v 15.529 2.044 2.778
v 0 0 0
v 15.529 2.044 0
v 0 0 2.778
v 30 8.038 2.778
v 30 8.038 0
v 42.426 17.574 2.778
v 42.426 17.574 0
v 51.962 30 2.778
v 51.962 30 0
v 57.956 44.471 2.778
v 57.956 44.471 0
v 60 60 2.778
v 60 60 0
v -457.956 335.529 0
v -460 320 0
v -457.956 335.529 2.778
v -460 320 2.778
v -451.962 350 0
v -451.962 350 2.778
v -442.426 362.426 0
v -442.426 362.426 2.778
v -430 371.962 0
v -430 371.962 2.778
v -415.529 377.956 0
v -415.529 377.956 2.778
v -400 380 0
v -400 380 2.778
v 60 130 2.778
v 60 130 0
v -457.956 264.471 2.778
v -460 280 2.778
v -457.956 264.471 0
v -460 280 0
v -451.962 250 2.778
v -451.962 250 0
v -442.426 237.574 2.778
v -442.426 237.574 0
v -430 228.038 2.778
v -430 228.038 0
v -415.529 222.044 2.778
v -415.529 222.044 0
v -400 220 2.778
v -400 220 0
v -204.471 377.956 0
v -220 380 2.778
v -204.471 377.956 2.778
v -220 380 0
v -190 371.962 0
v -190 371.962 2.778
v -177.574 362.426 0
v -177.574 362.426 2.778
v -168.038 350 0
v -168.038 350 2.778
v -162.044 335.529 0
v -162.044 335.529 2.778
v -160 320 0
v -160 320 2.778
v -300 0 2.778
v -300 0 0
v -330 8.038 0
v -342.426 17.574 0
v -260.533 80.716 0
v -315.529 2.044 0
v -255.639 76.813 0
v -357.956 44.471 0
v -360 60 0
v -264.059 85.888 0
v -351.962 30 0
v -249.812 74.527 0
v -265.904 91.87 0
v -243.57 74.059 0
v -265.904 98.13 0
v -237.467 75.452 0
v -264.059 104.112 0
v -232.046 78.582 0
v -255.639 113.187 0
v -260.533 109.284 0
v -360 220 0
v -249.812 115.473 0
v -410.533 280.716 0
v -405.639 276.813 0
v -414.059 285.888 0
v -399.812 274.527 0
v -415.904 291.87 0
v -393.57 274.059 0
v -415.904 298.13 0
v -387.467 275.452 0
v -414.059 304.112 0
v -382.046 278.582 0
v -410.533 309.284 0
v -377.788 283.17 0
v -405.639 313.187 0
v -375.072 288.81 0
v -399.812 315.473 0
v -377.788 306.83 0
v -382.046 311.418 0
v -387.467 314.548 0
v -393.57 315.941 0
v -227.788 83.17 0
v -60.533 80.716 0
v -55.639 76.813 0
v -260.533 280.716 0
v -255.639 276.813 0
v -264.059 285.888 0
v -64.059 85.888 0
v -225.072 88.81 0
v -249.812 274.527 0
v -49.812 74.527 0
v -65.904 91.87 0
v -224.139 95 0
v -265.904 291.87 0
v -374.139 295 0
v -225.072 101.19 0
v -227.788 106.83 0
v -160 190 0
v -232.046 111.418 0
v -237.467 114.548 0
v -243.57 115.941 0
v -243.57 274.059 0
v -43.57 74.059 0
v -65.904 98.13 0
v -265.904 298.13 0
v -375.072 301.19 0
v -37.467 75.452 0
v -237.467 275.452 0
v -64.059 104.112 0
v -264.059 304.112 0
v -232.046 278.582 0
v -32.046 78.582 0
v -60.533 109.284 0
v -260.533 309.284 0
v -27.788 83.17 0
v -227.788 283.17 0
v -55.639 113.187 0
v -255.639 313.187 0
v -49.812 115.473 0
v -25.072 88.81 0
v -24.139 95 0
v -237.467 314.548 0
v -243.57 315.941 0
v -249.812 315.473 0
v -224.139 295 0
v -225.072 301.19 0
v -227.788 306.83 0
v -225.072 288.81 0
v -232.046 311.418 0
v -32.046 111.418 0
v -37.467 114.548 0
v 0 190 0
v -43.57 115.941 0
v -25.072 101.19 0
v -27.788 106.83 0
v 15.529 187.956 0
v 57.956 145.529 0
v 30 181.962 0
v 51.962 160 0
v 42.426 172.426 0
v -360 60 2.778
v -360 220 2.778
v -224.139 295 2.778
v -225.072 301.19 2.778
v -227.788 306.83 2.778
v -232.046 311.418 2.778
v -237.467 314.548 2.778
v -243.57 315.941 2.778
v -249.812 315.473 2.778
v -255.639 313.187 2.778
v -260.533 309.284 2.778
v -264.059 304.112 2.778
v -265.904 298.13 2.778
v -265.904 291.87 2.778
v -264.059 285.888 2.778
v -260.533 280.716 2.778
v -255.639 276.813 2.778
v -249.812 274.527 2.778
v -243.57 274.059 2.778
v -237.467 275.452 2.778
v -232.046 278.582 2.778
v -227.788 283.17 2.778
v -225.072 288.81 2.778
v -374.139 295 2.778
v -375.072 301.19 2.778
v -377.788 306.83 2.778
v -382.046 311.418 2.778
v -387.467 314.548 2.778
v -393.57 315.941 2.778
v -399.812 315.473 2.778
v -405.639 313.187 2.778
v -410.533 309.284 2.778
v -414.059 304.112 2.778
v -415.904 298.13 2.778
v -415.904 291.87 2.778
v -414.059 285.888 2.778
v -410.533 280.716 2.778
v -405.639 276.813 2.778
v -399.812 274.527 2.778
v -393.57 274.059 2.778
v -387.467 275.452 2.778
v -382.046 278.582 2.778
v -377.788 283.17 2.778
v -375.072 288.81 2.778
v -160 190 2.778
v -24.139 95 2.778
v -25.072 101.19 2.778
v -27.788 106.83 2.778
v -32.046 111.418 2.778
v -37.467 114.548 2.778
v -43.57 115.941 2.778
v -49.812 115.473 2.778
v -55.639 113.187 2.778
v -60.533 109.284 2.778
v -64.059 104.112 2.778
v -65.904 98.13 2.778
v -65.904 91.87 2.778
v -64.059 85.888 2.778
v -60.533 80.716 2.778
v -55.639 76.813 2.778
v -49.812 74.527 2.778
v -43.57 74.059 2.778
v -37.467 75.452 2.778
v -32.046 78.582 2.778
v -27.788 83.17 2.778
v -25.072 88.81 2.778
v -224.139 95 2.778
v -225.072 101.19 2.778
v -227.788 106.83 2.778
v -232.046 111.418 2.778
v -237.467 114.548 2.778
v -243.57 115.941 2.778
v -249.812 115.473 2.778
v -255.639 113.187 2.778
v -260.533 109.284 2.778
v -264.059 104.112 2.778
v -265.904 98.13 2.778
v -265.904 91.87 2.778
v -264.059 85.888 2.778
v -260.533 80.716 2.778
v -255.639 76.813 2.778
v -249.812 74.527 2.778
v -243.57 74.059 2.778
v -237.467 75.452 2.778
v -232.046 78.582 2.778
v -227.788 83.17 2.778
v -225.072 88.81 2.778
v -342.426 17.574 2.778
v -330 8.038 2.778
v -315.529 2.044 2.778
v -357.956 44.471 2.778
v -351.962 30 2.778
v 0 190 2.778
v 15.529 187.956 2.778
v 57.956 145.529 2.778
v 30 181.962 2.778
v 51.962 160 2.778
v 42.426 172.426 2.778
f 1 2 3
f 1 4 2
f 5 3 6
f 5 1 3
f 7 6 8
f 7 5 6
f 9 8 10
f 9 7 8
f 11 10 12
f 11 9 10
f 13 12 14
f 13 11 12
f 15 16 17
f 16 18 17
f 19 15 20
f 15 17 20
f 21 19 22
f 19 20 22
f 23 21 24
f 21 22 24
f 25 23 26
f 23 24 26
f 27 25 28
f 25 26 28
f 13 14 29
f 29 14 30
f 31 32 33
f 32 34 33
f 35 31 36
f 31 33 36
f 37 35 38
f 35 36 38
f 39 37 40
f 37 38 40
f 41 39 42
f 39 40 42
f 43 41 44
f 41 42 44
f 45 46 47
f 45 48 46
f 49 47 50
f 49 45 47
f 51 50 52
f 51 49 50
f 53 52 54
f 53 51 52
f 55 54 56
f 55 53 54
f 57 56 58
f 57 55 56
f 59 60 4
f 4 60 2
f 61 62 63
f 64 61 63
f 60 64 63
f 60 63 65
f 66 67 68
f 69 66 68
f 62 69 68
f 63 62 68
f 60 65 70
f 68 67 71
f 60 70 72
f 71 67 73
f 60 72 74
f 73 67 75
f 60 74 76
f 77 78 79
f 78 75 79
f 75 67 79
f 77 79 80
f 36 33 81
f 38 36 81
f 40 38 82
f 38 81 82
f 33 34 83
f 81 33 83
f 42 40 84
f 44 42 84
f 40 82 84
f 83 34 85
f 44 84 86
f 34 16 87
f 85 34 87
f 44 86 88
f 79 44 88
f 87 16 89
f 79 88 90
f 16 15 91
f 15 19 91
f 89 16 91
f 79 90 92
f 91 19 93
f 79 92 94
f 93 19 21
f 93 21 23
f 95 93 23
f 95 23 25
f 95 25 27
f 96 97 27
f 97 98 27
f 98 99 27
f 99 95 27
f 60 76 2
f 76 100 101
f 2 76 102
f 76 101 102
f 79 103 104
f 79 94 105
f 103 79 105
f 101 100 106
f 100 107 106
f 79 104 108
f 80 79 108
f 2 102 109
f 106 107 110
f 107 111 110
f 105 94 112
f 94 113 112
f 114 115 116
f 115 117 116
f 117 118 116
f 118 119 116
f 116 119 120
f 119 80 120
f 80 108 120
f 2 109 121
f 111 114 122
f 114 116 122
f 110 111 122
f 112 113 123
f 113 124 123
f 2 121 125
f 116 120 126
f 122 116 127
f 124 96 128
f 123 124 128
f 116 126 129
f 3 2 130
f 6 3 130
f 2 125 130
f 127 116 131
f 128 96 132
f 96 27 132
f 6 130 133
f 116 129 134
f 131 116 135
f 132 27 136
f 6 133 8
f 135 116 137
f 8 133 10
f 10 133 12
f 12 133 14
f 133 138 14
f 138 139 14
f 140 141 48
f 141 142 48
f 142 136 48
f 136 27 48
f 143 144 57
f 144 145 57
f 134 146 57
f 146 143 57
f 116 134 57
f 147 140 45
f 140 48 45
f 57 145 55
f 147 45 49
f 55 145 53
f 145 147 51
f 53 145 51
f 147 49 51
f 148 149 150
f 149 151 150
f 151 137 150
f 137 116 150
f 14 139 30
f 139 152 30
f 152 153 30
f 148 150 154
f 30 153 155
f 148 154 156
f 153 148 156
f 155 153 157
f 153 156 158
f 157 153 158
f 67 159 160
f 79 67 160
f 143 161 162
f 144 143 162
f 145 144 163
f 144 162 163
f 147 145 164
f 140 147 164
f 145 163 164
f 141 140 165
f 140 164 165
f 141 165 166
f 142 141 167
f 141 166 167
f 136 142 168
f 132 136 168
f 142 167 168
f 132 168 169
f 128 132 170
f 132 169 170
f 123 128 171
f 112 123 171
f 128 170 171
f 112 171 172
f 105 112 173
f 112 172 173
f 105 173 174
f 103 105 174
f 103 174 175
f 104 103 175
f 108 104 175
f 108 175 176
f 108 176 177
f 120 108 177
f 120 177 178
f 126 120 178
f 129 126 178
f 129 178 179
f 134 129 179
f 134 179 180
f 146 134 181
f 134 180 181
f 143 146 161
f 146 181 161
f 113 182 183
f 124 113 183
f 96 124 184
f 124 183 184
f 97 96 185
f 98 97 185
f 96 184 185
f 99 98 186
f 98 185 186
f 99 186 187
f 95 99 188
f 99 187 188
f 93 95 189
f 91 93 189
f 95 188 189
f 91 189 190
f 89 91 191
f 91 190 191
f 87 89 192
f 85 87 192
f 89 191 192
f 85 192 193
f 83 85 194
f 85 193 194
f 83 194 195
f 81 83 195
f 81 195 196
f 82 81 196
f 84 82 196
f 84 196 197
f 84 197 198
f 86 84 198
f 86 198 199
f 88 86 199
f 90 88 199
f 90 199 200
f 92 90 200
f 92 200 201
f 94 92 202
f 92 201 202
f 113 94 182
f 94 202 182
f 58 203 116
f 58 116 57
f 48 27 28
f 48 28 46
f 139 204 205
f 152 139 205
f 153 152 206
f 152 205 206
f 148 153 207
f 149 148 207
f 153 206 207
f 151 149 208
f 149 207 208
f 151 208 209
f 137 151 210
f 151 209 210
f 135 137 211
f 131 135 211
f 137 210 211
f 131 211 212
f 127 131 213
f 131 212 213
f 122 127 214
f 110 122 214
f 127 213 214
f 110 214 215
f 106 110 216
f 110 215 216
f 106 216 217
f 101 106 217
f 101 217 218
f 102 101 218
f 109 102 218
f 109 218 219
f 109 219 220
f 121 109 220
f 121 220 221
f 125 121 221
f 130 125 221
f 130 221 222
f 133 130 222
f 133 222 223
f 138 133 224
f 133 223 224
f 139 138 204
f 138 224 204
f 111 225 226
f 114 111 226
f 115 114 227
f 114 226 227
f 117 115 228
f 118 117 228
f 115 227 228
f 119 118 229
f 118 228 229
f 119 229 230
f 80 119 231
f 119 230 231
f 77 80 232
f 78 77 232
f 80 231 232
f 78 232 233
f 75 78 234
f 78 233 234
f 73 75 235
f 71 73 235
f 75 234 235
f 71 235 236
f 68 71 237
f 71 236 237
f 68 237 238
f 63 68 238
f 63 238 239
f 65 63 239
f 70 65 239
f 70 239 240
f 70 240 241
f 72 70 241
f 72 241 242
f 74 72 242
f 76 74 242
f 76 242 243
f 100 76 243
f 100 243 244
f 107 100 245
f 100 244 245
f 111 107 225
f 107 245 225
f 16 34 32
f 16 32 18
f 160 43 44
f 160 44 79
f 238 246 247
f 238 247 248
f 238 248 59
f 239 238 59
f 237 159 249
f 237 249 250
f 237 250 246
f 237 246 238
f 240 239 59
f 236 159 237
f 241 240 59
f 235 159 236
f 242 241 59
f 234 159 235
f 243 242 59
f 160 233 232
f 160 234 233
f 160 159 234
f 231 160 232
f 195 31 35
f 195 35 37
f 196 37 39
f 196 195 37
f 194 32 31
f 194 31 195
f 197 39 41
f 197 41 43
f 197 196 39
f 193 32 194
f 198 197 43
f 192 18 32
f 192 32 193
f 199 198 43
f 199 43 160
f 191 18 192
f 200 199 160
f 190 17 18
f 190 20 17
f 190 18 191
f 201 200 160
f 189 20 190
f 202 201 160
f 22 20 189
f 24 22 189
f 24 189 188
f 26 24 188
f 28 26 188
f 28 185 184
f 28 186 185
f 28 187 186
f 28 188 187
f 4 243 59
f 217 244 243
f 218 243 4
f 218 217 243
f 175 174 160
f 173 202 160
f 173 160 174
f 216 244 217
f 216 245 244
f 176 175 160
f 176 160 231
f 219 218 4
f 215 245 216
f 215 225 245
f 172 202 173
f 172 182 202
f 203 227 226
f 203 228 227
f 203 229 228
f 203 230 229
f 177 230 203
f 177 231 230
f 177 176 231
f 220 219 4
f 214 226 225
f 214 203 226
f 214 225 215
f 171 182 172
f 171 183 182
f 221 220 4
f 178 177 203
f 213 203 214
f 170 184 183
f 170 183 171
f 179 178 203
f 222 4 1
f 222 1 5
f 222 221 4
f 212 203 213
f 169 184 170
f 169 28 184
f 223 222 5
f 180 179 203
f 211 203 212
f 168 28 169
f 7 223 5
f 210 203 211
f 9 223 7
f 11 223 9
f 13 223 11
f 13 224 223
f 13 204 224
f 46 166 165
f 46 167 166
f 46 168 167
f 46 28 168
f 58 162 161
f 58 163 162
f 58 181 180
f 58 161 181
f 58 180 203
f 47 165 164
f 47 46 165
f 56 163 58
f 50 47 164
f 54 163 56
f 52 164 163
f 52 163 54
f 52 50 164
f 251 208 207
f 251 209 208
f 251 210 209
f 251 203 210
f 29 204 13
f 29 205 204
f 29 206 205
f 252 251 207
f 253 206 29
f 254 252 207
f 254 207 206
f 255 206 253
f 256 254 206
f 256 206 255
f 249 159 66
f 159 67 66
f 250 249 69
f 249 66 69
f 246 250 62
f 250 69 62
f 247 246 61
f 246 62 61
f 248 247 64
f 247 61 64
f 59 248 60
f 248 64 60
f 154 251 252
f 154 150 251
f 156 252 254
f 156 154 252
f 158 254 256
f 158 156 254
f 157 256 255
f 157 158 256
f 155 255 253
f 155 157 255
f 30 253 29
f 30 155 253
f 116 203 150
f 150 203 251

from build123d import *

# Parameters (mm, degrees)
SKETCH1_W           = 520
SKETCH1_H           = 380
BOSS_EXTRUDE1_DEPTH = 2.778125
SKETCH2_W           = 220
SKETCH2_H           = 190
CUT_EXTRUDE1_DEPTH  = 2.778125
SKETCH3_W           = 100
SKETCH3_H           = 220
CUT_EXTRUDE2_DEPTH  = 2.778125
FILLET2_R           = 60
FILLET3_R           = 60
SKETCH4_R           = 21
CUT_EXTRUDE3_DEPTH  = 2.778125


with BuildPart() as part:
    # Sketch1 → Boss-Extrude1 (new body)
    with BuildSketch(Plane.XY):
        with Locations((-200, 190)):
            Rectangle(SKETCH1_W, SKETCH1_H)
    extrude(amount=BOSS_EXTRUDE1_DEPTH)

    # Sketch2 → Cut-Extrude1 (cut)
    with BuildSketch(Plane.XY.offset(2.778125)):
        with Locations((-50, 285)):
            Rectangle(SKETCH2_W, SKETCH2_H)
    extrude(amount=-CUT_EXTRUDE1_DEPTH, mode=Mode.SUBTRACT)

    # Sketch3 → Cut-Extrude2 (cut)
    with BuildSketch(Plane.XY.offset(2.778125)):
        with Locations((-410, 110)):
            Rectangle(SKETCH3_W, SKETCH3_H)
    extrude(amount=-CUT_EXTRUDE2_DEPTH, mode=Mode.SUBTRACT)

    # Fillet2
    fillet2_edges = [part.edges().sort_by_distance(p)[0] for p in [
        (-460, 220, 1.3890625),
        (-460, 380, 1.3890625),
    ]]
    fillet(fillet2_edges, radius=FILLET2_R)

    # Fillet3
    fillet3_edges = [part.edges().sort_by_distance(p)[0] for p in [
        (60, 190, 1.3890625),
        (-160, 380, 1.3890625),
        (-360, 0, 1.3890625),
        (60, 0, 1.3890625),
    ]]
    fillet(fillet3_edges, radius=FILLET3_R)

    # Sketch4 → Cut-Extrude3 (cut)
    with BuildSketch(Plane.XY.offset(2.778125)):
        with Locations((-395.138918322, 295)):
            Circle(SKETCH4_R)
        with Locations((-245.138918322, 295)):
            Circle(SKETCH4_R)
        with Locations((-245.138918322, 95)):
            Circle(SKETCH4_R)
        with Locations((-45.138918322, 95)):
            Circle(SKETCH4_R)
    extrude(amount=-CUT_EXTRUDE3_DEPTH, mode=Mode.SUBTRACT)


solid = part.part
